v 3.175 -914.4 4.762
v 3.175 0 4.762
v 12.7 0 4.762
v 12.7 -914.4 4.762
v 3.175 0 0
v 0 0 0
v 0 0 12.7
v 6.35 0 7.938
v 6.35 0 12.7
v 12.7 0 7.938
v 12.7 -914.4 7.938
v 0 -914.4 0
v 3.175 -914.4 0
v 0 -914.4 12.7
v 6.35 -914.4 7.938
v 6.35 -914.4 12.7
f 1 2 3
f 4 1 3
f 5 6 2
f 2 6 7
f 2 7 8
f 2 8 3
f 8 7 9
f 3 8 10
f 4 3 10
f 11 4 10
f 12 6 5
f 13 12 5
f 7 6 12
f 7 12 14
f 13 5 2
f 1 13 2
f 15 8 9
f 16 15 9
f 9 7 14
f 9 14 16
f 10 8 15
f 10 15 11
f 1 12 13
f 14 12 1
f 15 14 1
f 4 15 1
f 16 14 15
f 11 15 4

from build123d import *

# Parameters (mm, degrees)
F0_W     = 12.7
F0_H     = 12.7
F1_DEPTH = 914.4
F2_W     = 9.525
F2_H     = 4.7625
F3_DEPTH = 914.401
F4_W     = 6.35
F4_H     = 4.7625
F5_DEPTH = 914.401


with BuildPart() as f1:
    # F0 (on Front) → F1 (new body)
    with BuildSketch(Plane.XZ):
        with Locations((6.35, 6.35)):
            Rectangle(F0_W, F0_H)
    extrude(amount=F1_DEPTH)

    # F2 (on Front) → F3 (cut, through all)
    with BuildSketch(Plane.XZ):
        with Locations((7.9375, 2.38125)):
            Rectangle(F2_W, F2_H)
    extrude(amount=F3_DEPTH, mode=Mode.SUBTRACT)

    # F4 (on Front) → F5 (cut, through all)
    with BuildSketch(Plane.XZ):
        with Locations((9.525, 10.31875)):
            Rectangle(F4_W, F4_H)
    extrude(amount=F5_DEPTH, mode=Mode.SUBTRACT)


solid = f1.part
